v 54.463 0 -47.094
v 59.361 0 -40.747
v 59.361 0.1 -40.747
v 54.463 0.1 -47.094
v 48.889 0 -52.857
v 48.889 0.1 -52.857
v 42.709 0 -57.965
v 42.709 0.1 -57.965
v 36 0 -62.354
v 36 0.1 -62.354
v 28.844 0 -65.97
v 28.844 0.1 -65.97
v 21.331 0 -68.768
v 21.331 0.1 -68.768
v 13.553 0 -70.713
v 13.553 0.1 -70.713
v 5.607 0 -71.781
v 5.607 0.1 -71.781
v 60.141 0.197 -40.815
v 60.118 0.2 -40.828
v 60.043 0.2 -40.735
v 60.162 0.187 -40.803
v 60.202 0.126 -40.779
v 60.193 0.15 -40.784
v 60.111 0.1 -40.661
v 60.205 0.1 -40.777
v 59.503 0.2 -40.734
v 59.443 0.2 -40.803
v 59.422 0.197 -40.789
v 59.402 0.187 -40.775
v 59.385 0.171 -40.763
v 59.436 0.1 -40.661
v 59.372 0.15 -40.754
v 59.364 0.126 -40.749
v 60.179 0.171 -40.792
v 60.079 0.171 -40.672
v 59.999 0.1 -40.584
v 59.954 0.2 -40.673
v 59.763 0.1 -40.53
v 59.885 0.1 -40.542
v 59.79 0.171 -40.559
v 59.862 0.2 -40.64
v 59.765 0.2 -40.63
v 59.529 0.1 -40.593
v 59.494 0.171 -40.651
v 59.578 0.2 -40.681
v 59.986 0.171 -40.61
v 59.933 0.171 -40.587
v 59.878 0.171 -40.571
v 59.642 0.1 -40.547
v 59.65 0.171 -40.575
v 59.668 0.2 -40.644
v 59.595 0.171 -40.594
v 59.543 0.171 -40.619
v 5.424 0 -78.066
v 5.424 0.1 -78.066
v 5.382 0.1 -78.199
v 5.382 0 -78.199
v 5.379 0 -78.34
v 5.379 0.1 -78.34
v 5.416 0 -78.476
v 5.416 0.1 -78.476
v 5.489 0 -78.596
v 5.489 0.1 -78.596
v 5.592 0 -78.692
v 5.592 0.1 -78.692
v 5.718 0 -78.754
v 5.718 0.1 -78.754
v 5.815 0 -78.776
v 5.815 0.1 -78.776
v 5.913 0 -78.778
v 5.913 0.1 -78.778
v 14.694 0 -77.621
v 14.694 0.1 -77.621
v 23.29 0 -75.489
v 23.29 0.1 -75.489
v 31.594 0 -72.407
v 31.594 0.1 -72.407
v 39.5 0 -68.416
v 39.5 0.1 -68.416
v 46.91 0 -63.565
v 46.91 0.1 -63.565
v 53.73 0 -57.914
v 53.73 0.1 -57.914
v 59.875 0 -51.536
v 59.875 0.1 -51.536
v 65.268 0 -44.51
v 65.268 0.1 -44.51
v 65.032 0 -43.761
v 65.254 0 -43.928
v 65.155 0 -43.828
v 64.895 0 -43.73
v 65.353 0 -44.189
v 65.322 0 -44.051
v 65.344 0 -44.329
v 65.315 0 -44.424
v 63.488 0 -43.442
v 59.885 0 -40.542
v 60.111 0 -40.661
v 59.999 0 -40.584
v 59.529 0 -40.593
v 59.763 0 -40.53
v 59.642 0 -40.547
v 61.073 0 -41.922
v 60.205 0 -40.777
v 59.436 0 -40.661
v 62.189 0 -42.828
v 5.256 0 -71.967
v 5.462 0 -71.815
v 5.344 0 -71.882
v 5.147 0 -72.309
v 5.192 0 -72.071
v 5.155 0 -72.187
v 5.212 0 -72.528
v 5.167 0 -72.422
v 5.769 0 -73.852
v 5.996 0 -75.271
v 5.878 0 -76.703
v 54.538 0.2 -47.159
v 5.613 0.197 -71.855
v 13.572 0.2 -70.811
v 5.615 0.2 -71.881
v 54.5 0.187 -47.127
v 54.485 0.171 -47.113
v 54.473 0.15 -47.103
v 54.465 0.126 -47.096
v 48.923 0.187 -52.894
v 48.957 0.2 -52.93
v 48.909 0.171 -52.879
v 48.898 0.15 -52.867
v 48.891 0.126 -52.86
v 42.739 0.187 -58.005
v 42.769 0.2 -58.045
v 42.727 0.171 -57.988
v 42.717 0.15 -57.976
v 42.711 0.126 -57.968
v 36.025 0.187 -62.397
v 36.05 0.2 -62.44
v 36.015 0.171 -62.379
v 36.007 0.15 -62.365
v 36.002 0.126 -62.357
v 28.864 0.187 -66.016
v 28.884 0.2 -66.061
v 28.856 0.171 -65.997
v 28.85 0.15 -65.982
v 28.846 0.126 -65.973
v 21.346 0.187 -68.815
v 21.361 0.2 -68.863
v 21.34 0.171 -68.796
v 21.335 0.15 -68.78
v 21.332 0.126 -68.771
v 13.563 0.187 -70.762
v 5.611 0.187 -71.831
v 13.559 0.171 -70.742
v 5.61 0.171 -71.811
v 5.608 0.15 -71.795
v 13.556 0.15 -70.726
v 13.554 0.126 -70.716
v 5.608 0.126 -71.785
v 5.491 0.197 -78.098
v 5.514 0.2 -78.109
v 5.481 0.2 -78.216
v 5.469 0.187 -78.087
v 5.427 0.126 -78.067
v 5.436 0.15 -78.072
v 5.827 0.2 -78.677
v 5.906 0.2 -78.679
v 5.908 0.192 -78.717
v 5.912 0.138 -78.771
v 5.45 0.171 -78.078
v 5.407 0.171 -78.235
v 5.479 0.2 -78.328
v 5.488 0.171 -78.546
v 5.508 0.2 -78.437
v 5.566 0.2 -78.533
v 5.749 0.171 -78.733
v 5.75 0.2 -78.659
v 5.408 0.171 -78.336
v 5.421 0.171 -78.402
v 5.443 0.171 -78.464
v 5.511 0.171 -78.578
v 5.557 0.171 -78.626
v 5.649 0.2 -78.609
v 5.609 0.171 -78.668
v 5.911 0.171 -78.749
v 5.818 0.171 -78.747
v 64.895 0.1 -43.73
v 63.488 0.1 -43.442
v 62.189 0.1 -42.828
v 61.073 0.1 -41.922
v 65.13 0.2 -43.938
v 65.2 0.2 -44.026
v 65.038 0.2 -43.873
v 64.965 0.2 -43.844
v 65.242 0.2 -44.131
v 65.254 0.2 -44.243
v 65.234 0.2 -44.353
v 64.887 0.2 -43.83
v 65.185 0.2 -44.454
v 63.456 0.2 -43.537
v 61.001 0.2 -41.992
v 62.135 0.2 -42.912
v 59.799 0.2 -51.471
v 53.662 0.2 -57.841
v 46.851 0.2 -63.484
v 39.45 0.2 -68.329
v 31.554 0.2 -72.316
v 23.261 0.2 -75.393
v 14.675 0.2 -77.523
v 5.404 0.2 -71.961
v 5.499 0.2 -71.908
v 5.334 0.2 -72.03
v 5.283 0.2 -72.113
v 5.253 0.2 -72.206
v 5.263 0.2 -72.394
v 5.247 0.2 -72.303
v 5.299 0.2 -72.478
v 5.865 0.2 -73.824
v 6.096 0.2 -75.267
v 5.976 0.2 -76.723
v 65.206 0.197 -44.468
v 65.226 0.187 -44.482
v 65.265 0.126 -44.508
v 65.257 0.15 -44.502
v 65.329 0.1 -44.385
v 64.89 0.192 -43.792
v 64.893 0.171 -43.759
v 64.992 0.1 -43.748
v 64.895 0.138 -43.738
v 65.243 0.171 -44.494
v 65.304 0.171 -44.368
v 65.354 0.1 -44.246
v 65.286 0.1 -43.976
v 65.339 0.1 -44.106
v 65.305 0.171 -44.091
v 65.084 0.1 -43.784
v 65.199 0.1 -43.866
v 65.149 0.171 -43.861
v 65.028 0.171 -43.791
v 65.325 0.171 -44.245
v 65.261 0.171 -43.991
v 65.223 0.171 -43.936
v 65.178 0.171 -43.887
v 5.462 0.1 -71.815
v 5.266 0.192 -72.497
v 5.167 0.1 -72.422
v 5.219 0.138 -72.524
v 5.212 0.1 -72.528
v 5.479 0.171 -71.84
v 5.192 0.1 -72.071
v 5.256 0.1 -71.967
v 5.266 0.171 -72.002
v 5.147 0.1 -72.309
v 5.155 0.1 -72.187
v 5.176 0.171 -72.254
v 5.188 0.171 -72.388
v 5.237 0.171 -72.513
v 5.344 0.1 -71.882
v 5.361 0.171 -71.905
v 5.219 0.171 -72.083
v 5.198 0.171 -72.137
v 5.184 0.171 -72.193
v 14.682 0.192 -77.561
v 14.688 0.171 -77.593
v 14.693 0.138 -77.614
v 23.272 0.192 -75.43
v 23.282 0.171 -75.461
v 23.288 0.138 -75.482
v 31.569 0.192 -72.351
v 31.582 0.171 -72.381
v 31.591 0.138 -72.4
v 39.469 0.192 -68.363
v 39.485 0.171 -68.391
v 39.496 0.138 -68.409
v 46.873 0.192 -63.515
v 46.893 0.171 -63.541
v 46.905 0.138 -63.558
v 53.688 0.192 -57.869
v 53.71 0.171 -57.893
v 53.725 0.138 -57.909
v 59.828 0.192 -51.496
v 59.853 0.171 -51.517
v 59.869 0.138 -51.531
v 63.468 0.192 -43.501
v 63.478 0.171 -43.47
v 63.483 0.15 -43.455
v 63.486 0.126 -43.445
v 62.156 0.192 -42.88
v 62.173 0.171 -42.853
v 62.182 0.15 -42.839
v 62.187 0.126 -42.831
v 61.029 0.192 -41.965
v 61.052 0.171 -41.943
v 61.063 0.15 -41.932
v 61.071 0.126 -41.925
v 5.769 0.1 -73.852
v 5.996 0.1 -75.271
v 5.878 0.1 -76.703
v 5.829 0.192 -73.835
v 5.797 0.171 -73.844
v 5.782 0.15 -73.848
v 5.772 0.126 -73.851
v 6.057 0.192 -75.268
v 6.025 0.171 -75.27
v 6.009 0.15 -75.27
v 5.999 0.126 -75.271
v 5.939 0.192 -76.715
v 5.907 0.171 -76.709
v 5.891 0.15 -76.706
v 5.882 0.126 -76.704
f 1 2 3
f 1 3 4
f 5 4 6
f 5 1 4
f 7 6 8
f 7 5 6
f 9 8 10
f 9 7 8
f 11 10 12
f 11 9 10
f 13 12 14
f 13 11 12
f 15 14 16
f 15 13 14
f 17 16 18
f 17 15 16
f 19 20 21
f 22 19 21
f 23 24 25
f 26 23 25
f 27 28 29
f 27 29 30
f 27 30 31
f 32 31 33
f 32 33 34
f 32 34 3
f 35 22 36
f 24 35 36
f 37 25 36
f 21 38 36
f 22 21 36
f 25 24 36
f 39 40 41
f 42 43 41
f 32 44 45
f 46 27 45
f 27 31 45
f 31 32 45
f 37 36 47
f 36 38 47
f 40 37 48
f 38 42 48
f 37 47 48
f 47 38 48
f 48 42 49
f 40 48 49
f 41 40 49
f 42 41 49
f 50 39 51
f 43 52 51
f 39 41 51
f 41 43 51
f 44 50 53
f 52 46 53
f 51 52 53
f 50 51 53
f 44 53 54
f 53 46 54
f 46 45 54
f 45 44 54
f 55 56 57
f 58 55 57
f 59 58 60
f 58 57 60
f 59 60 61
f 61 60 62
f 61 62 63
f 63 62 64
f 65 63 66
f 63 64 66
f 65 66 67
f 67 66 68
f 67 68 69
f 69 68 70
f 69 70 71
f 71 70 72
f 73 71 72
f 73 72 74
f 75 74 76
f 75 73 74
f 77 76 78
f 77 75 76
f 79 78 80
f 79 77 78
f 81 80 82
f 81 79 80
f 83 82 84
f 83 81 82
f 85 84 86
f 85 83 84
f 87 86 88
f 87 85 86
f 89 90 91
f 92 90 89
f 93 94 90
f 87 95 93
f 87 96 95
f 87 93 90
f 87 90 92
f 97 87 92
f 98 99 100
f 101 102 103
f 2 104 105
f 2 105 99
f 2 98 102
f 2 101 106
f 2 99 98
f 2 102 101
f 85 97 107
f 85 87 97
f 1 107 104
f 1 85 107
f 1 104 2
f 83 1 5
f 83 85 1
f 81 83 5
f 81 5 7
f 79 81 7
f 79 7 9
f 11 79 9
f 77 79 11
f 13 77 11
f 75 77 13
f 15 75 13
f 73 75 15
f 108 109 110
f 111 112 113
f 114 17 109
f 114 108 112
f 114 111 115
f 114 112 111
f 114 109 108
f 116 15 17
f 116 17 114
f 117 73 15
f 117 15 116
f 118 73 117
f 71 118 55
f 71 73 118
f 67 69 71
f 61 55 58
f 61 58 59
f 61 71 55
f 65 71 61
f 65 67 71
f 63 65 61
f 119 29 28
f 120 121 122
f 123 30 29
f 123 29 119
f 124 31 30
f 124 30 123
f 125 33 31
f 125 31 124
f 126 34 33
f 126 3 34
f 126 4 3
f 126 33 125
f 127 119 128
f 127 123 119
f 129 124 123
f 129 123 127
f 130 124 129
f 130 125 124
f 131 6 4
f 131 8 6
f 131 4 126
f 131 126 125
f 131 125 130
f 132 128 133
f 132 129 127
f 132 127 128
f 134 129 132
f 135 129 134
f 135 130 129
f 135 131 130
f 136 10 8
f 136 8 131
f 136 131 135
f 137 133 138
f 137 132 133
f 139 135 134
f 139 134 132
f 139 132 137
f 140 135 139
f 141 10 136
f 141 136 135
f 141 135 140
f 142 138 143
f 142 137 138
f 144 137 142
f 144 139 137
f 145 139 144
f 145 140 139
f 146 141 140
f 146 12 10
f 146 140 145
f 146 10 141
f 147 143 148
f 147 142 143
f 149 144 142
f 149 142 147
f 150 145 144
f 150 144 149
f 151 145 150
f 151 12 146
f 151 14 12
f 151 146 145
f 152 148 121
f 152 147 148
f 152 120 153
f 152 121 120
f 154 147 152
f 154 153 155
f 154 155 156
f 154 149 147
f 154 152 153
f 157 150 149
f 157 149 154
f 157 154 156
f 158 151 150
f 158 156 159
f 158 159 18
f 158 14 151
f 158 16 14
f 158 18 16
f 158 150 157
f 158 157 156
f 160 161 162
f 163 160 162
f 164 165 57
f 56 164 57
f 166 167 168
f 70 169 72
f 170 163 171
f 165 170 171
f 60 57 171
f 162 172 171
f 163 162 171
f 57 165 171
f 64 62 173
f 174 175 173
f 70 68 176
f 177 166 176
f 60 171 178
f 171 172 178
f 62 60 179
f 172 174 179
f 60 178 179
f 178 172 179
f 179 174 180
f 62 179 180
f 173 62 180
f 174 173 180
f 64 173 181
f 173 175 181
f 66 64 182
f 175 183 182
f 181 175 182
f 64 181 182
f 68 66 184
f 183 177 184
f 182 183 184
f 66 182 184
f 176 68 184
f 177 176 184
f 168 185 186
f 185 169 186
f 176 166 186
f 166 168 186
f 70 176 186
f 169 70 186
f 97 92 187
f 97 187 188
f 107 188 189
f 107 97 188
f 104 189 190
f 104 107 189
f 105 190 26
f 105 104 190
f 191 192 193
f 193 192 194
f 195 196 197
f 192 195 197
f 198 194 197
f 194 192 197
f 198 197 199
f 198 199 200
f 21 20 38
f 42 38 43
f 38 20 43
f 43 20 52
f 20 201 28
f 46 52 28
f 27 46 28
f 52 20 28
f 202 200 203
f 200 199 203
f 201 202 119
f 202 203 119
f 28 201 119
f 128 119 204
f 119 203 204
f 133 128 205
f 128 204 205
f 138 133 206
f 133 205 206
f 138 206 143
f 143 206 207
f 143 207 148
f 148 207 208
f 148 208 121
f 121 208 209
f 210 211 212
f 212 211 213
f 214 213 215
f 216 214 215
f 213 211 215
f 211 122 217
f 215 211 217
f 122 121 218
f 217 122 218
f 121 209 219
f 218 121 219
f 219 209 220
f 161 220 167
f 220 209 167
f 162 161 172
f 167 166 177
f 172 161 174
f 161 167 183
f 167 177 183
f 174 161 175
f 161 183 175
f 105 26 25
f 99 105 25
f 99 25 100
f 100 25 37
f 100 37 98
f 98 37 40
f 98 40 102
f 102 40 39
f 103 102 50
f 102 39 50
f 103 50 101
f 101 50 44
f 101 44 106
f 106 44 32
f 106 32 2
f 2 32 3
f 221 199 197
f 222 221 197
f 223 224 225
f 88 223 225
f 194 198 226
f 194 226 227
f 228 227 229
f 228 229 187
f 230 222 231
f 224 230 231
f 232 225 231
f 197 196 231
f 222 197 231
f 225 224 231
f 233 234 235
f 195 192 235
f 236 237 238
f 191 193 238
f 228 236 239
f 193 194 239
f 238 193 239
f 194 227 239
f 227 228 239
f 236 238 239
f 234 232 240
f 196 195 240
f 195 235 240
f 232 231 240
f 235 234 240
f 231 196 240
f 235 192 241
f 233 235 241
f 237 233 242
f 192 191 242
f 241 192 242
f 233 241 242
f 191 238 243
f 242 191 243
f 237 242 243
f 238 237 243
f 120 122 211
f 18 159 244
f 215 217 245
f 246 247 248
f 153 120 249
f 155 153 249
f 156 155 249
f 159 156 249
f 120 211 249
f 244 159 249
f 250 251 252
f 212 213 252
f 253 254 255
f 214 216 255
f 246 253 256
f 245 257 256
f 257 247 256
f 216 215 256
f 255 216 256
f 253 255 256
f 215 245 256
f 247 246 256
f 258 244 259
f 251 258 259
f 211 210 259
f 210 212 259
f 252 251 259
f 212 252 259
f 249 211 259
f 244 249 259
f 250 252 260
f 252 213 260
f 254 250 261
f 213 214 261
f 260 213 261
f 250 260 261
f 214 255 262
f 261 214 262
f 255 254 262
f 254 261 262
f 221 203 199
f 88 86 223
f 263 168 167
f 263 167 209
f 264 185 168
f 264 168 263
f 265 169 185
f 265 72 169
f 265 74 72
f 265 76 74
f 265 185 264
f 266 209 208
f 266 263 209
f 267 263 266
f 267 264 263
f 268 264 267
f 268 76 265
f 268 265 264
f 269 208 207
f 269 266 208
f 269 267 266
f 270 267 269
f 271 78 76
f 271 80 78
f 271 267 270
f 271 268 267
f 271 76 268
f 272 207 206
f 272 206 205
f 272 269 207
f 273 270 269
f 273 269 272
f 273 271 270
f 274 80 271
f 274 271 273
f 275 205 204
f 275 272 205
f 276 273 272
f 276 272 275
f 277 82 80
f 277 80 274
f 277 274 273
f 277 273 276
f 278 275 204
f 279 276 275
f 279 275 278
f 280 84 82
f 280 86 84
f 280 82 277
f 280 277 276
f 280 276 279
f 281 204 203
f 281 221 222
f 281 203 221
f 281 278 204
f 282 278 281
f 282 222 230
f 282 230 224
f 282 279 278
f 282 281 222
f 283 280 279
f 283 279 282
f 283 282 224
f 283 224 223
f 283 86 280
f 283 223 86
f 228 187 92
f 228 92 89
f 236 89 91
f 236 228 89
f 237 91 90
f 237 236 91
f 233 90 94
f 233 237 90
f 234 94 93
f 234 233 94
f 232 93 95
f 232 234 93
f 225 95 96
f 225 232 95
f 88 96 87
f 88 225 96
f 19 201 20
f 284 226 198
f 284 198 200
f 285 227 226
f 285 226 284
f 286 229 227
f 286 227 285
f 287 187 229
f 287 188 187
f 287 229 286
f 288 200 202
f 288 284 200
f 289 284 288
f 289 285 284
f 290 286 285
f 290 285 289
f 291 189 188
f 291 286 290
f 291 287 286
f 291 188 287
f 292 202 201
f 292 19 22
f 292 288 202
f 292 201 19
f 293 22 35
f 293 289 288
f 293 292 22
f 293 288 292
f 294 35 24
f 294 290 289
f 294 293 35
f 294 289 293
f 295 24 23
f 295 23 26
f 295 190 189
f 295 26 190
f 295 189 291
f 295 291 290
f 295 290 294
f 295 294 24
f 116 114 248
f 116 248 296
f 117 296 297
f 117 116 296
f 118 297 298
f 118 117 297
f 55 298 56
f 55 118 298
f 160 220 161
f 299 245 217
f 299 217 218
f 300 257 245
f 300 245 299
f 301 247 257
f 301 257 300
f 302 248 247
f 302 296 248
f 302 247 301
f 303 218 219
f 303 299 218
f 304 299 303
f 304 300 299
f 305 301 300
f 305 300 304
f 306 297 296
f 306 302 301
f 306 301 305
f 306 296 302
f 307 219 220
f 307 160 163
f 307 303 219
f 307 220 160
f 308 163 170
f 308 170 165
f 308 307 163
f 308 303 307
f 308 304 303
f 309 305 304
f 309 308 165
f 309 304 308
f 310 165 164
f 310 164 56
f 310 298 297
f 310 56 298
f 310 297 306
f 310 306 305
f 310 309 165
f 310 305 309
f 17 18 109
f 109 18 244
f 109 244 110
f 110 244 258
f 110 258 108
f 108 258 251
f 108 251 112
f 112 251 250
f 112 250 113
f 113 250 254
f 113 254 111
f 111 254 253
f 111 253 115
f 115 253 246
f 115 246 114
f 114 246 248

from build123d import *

# Parameters (mm, degrees)
BOSS_EXTRUDE1_DEPTH = 0.2
FILLET1_R           = 0.5
FILLET2_R           = 0.1


with BuildPart() as part:
    # Sketch1 → Boss-Extrude1 (new body)
    with BuildSketch(Plane(origin=(0, 0, 0), x_dir=(1, 0, 0), z_dir=(0, 1, 0))):
        with BuildLine():
            ThreePointArc((65.788496696, 43.736411632), (62.218735106, 42.846595528), (59.839367736, 40.040605253))
            ThreePointArc((59.839367736, 40.040605253), (36, 62.353829072), (4.756497464, 71.842715232))
            ThreePointArc((4.756497464, 71.842715232), (5.99687264, 75.306302957), (4.982595195, 78.842715232))
            ThreePointArc((4.982595195, 78.842715232), (39.5, 68.416006899), (65.788496696, 43.736411632))
        make_face()
    extrude(amount=BOSS_EXTRUDE1_DEPTH)

    # Fillet1
    fillet1_edges = [part.edges().sort_by_distance(p)[0] for p in [
        (65.788496696, 0.1, -43.736411632),
        (59.839367736, 0.1, -40.040605253),
        (4.756497464, 0.1, -71.842715232),
        (4.982595195, 0.1, -78.842715232),
    ]]
    fillet(fillet1_edges, radius=FILLET1_R)

    # Fillet2
    fillet2_edges = [part.edges().sort_by_distance(p)[0] for p in [
        (36, 0.2, -62.353829072),
        (5.995621864, 0.2, -75.270830923),
        (39.5, 0.2, -68.416006899),
        (62.188640811, 0.2, -42.827776307),
        (65.305737696, 0.2, -44.012960805),
        (59.791175202, 0.2, -40.530040556),
        (5.463473305, 0.2, -78.56290826),
        (5.204457137, 0.2, -72.045696925),
    ]]
    fillet(fillet2_edges, radius=FILLET2_R)


solid = part.part
